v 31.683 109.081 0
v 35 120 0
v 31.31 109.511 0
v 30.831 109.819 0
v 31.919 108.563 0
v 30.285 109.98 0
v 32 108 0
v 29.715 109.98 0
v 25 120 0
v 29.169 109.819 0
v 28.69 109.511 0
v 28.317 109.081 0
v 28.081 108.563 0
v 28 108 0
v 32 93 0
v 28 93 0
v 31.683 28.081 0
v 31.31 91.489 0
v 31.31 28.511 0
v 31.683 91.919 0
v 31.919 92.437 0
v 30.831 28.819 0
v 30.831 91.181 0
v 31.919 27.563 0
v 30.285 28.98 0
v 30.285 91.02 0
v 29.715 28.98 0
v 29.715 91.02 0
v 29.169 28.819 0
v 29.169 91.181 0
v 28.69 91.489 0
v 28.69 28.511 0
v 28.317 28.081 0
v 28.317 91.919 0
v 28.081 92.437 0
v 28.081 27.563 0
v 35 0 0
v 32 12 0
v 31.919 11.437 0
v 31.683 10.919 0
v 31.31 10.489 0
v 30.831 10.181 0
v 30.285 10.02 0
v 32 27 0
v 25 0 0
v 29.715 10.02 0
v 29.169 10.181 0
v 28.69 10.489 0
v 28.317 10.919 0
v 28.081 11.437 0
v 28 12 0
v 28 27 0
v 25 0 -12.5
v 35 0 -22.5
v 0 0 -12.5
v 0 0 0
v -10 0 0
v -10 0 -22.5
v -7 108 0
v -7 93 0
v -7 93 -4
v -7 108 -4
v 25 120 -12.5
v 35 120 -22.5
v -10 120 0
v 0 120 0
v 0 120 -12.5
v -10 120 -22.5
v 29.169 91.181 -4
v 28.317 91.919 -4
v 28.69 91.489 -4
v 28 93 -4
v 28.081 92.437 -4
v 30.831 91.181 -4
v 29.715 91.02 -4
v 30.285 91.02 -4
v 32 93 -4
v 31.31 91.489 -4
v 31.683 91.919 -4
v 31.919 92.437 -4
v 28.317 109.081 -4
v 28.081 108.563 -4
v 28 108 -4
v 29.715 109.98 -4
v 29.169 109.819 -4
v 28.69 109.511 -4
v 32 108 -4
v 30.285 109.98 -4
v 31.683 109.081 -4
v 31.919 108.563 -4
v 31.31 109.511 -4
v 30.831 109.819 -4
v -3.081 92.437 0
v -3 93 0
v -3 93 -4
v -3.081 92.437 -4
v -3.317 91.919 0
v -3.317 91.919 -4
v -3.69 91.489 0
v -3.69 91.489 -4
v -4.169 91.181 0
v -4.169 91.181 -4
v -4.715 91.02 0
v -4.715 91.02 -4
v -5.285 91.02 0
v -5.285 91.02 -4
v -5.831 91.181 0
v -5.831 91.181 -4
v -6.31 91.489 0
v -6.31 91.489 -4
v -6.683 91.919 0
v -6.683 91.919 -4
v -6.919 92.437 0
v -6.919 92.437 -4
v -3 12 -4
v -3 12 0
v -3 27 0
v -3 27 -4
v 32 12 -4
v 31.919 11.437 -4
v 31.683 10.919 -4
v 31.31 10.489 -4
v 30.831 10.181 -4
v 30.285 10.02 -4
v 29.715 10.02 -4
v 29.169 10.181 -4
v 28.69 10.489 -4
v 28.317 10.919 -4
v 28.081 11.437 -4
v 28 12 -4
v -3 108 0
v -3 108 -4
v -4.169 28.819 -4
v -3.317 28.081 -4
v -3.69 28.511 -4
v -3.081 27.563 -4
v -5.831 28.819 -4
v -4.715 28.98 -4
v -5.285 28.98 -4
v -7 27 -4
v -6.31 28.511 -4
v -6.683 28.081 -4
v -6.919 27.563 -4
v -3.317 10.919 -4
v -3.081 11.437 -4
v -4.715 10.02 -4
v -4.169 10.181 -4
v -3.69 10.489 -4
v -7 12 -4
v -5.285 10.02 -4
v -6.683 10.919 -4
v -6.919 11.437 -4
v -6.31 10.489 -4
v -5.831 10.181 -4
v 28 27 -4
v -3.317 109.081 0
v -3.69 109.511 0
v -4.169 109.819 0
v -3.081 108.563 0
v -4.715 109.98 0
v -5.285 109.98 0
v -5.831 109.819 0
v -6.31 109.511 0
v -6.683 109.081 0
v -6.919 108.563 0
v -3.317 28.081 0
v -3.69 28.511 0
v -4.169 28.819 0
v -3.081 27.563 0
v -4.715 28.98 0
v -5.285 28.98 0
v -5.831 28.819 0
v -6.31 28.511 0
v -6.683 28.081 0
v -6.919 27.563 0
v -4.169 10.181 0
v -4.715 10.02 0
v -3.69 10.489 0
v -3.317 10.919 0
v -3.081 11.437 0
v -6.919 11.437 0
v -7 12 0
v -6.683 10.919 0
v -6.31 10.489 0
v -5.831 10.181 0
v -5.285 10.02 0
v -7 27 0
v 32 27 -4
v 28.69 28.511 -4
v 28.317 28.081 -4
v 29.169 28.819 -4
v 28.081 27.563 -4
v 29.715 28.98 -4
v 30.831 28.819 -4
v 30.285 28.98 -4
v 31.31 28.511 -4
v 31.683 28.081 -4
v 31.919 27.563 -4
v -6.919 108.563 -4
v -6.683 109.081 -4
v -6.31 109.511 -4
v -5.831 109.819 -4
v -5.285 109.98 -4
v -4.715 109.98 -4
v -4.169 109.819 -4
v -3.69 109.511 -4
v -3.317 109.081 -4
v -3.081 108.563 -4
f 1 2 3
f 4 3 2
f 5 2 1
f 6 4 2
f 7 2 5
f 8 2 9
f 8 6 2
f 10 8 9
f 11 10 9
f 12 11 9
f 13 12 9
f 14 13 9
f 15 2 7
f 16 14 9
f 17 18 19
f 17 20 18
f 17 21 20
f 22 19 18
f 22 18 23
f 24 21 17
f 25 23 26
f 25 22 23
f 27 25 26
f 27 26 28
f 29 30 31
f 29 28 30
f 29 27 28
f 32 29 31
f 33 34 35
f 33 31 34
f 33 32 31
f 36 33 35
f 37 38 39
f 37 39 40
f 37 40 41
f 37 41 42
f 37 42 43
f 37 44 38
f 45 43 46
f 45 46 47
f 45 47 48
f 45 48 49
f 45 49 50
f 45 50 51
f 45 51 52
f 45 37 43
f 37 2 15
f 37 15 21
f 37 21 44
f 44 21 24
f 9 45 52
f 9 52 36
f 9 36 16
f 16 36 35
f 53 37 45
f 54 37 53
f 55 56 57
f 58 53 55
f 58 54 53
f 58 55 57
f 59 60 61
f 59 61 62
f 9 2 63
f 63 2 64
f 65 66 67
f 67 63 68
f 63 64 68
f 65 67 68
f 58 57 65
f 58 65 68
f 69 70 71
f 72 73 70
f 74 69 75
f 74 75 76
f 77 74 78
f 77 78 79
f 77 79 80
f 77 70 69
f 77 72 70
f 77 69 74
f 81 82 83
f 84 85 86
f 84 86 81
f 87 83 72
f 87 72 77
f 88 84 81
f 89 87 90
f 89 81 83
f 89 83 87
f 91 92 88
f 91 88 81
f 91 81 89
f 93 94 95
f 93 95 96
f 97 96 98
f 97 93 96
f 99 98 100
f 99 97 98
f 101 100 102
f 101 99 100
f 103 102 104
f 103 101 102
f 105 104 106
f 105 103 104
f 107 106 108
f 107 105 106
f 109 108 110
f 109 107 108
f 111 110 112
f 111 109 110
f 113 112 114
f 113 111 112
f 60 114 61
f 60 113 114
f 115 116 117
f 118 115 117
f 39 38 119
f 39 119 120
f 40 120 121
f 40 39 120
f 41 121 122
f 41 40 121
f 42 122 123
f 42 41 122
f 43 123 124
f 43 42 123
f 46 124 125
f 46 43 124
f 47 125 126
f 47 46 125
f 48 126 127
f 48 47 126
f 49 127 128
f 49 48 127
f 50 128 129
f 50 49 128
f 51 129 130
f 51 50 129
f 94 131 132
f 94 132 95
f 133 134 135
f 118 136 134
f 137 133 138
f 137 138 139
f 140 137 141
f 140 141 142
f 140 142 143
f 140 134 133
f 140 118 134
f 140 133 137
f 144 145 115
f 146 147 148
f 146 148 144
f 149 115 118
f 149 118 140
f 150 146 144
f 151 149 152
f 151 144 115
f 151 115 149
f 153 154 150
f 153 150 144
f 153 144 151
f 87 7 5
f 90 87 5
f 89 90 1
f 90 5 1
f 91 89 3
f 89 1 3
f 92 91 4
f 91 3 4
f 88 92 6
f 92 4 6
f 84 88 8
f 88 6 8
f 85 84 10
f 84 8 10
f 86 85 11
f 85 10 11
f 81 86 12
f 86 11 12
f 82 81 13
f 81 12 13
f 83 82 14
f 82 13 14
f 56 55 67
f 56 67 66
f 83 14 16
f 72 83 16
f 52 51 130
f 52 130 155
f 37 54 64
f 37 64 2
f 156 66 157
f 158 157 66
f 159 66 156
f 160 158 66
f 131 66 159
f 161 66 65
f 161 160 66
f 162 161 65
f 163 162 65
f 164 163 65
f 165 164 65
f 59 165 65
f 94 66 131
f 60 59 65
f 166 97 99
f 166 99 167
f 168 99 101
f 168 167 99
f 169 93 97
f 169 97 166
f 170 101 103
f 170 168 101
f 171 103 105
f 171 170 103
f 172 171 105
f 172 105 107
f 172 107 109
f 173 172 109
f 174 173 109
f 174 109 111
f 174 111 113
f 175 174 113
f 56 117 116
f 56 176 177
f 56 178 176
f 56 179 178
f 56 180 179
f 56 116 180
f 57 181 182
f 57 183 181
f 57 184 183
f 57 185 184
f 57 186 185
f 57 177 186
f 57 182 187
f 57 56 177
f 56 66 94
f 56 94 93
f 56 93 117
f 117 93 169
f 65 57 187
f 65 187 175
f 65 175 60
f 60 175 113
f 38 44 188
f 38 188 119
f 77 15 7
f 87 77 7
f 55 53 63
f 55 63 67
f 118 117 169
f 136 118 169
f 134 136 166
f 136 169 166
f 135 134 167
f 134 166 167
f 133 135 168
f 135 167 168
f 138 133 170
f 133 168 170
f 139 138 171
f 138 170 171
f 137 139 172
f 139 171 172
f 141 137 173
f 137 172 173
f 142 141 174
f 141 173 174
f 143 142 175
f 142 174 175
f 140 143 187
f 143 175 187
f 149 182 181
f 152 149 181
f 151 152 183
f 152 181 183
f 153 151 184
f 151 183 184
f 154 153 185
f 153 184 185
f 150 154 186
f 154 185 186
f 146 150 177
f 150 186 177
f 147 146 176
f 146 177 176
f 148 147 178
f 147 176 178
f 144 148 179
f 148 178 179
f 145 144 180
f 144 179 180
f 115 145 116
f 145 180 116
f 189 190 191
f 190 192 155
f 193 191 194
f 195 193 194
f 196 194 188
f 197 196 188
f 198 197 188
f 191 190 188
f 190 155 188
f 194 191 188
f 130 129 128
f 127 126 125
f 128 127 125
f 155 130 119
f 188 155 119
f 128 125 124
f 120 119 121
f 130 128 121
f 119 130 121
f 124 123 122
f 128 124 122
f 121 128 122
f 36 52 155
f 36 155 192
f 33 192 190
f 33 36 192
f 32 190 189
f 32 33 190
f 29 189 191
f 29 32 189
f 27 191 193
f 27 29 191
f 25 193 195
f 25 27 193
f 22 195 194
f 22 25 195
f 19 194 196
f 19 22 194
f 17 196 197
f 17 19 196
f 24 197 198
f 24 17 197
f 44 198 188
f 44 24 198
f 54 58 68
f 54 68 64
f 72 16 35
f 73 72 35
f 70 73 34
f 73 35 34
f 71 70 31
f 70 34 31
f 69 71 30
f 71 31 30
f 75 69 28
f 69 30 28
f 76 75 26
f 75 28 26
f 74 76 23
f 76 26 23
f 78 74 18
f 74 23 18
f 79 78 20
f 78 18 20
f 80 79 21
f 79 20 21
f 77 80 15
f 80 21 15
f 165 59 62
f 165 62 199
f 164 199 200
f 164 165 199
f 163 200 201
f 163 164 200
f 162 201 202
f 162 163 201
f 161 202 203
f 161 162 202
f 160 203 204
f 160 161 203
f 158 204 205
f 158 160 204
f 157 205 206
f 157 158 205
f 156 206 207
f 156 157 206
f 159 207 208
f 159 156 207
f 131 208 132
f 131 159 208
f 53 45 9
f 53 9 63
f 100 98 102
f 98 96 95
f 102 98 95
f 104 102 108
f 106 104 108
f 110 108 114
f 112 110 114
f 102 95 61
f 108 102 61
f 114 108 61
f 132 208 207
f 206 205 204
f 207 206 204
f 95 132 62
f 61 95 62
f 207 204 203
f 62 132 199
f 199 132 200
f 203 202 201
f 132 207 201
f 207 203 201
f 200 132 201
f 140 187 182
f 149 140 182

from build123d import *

# Parameters (mm, degrees)
BOSS_EXTRUDE1_DEPTH  = 120
CUT_EXTRUDE1_DEPTH   = 4
MIRROR2_COPY_1_DEPTH = 4


with BuildPart() as part:
    # Sketch2 → Boss-Extrude1 (new body)
    with BuildSketch(Plane(origin=(0, 0, 0), x_dir=(1, 0, 0), z_dir=(0, 1, 0))):
        Polygon((0, 0), (-10, 0), (-10, 22.5), (35, 22.5), (35, 0), (25, 0), (25, 12.5), (0, 12.5), align=None)
    extrude(amount=BOSS_EXTRUDE1_DEPTH)

    # Sketch3 → Cut-Extrude1 (cut)
    with BuildSketch(Plane.XY):
        with BuildLine():
            Line((28, 108), (28, 93))
            ThreePointArc((28, 93), (30, 91), (32, 93))
            Line((32, 93), (32, 108))
            ThreePointArc((32, 108), (30, 110), (28, 108))
        make_face()
    cut_extrude1 = extrude(amount=-CUT_EXTRUDE1_DEPTH, mode=Mode.SUBTRACT)

    # Mirror1: Cut-Extrude1 across plane
    add(cut_extrude1.mirror(Plane.ZY.offset(-12.5)), mode=Mode.SUBTRACT)

    # Mirror2: Cut-Extrude1 across plane
    add(cut_extrude1.mirror(Plane(origin=(0, 60, 0), x_dir=(0, 0, 1), z_dir=(0, -1, 0))), mode=Mode.SUBTRACT)

    # Mirror2 copy 1 sketch → Mirror2 copy 1 (cut)
    with BuildSketch(Plane(origin=(25, 120, 0), x_dir=(-1, 0, 0), z_dir=(0, 0, 1))):
        with BuildLine():
            Line((28, 108), (28, 93))
            ThreePointArc((28, 93), (30, 91), (32, 93))
            Line((32, 93), (32, 108))
            ThreePointArc((32, 108), (30, 110), (28, 108))
        make_face()
    extrude(amount=-MIRROR2_COPY_1_DEPTH, mode=Mode.SUBTRACT)


solid = part.part
